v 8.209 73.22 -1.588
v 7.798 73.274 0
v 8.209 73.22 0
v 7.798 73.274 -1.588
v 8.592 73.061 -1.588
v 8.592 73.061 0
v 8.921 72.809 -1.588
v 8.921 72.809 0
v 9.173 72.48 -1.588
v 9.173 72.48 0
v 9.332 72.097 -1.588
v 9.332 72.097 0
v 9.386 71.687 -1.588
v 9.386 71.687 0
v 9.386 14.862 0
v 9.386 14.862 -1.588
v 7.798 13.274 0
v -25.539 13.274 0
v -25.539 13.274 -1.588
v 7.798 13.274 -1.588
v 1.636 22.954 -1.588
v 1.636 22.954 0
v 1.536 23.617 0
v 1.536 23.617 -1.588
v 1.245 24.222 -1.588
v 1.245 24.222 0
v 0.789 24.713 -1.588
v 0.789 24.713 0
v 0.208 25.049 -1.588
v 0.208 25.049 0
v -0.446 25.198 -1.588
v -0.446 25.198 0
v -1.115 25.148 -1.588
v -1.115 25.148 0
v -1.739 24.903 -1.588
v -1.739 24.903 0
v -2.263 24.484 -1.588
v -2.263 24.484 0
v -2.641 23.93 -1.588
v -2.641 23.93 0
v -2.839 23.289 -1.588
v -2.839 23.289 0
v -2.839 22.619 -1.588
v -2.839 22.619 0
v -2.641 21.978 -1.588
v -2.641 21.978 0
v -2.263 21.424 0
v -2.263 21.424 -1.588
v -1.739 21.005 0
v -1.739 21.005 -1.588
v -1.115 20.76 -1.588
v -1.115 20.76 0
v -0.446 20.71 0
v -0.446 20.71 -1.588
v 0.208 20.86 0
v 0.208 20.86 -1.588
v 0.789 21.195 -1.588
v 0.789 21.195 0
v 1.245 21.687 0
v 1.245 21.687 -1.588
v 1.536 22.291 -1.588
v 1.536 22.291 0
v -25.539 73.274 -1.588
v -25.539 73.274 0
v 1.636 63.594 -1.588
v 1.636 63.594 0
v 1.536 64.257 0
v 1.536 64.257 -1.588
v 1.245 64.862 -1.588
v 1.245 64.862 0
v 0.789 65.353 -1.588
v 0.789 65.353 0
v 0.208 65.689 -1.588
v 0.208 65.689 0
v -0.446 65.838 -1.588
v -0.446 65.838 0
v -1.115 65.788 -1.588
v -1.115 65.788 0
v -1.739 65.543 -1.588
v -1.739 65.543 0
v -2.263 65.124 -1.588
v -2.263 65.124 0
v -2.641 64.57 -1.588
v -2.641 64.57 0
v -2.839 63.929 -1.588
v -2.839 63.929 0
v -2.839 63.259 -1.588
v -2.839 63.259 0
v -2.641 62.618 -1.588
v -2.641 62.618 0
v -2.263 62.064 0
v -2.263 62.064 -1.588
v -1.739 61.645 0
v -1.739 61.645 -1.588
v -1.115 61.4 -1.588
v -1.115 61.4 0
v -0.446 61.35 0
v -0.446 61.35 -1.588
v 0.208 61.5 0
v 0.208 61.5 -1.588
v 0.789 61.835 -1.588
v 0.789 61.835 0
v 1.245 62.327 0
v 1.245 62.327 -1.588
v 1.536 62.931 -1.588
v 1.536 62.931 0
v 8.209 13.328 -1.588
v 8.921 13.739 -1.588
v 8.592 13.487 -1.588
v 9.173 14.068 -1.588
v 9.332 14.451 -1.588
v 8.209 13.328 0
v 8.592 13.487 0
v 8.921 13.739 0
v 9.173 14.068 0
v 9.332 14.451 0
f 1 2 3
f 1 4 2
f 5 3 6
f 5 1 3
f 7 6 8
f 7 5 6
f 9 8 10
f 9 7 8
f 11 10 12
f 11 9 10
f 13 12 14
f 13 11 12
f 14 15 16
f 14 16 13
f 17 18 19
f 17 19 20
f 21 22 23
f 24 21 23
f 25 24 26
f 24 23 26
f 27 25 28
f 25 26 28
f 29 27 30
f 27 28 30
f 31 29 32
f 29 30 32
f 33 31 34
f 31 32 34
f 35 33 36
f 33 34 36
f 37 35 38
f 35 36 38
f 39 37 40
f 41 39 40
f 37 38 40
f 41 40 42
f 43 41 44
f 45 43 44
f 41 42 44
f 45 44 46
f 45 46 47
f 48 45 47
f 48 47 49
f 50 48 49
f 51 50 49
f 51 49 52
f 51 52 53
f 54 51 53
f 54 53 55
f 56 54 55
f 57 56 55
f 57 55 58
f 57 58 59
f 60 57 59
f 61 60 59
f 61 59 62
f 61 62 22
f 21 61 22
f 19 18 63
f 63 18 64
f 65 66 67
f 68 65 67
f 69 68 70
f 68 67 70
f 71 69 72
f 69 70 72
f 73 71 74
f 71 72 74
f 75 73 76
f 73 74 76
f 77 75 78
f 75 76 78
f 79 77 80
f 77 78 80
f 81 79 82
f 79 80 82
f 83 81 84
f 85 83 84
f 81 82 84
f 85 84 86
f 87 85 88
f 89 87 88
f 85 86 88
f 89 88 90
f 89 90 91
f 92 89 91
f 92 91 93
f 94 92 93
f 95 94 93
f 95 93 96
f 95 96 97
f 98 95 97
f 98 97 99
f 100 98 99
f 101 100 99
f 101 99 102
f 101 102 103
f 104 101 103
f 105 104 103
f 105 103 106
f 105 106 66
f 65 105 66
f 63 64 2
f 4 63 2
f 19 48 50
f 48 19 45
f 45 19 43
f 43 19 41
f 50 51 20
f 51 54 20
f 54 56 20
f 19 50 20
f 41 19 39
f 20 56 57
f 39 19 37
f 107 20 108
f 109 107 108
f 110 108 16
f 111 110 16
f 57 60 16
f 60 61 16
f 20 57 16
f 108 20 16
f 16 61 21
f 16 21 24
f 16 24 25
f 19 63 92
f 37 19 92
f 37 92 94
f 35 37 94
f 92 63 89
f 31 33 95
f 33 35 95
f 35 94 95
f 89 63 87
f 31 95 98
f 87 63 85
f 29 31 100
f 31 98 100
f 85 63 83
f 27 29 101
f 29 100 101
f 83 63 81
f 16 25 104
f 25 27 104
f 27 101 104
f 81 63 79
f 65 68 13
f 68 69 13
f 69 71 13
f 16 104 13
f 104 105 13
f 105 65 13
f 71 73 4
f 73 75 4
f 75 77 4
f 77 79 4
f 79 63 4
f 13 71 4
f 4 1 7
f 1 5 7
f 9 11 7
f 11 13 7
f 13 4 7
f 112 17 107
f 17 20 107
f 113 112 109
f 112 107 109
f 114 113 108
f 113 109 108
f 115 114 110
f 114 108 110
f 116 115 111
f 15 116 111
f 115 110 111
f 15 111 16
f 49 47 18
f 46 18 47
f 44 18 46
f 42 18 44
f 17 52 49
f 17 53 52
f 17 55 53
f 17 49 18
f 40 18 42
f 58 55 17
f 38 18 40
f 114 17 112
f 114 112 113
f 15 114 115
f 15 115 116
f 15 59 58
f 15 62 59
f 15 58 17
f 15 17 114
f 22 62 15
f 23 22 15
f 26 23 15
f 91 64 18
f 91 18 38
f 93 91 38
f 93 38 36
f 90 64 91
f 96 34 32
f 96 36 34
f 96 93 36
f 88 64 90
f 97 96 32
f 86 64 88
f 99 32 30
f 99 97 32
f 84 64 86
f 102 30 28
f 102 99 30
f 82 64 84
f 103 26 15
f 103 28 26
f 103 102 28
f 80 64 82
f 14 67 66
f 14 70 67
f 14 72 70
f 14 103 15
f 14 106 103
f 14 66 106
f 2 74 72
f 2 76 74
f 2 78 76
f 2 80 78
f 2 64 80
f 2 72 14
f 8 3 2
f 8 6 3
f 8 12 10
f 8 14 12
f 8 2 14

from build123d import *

# Parameters (mm, degrees)
SKETCH1_W            = 34.925
SKETCH1_H            = 60
BOSS_EXTRUDE1_DEPTH  = 1.5875
M4_CLEARANCE_HOLE1_D = 4.5
FILLET1_R            = 1.5875


with BuildPart() as part:
    # Sketch1 → Boss-Extrude1 (new body)
    with BuildSketch(Plane.XY):
        with Locations((-8.076586607, 43.274042014)):
            Rectangle(SKETCH1_W, SKETCH1_H)
    extrude(amount=-BOSS_EXTRUDE1_DEPTH)

    # M4 Clearance Hole1 (through all)
    with Locations(Plane(origin=(0, 0, -1.5875), x_dir=(-1, 0, 0), z_dir=(0, 0, -1))):
        with Locations((0.614086607, 63.594042014), (0.614086607, 22.954042014)):
            Hole(M4_CLEARANCE_HOLE1_D / 2)

    # Fillet1
    fillet1_edges = [part.edges().sort_by_distance(p)[0] for p in [
        (9.385913393, 13.274042014, -0.79375),
        (9.385913393, 73.274042014, -0.79375),
    ]]
    fillet(fillet1_edges, radius=FILLET1_R)


solid = part.part
